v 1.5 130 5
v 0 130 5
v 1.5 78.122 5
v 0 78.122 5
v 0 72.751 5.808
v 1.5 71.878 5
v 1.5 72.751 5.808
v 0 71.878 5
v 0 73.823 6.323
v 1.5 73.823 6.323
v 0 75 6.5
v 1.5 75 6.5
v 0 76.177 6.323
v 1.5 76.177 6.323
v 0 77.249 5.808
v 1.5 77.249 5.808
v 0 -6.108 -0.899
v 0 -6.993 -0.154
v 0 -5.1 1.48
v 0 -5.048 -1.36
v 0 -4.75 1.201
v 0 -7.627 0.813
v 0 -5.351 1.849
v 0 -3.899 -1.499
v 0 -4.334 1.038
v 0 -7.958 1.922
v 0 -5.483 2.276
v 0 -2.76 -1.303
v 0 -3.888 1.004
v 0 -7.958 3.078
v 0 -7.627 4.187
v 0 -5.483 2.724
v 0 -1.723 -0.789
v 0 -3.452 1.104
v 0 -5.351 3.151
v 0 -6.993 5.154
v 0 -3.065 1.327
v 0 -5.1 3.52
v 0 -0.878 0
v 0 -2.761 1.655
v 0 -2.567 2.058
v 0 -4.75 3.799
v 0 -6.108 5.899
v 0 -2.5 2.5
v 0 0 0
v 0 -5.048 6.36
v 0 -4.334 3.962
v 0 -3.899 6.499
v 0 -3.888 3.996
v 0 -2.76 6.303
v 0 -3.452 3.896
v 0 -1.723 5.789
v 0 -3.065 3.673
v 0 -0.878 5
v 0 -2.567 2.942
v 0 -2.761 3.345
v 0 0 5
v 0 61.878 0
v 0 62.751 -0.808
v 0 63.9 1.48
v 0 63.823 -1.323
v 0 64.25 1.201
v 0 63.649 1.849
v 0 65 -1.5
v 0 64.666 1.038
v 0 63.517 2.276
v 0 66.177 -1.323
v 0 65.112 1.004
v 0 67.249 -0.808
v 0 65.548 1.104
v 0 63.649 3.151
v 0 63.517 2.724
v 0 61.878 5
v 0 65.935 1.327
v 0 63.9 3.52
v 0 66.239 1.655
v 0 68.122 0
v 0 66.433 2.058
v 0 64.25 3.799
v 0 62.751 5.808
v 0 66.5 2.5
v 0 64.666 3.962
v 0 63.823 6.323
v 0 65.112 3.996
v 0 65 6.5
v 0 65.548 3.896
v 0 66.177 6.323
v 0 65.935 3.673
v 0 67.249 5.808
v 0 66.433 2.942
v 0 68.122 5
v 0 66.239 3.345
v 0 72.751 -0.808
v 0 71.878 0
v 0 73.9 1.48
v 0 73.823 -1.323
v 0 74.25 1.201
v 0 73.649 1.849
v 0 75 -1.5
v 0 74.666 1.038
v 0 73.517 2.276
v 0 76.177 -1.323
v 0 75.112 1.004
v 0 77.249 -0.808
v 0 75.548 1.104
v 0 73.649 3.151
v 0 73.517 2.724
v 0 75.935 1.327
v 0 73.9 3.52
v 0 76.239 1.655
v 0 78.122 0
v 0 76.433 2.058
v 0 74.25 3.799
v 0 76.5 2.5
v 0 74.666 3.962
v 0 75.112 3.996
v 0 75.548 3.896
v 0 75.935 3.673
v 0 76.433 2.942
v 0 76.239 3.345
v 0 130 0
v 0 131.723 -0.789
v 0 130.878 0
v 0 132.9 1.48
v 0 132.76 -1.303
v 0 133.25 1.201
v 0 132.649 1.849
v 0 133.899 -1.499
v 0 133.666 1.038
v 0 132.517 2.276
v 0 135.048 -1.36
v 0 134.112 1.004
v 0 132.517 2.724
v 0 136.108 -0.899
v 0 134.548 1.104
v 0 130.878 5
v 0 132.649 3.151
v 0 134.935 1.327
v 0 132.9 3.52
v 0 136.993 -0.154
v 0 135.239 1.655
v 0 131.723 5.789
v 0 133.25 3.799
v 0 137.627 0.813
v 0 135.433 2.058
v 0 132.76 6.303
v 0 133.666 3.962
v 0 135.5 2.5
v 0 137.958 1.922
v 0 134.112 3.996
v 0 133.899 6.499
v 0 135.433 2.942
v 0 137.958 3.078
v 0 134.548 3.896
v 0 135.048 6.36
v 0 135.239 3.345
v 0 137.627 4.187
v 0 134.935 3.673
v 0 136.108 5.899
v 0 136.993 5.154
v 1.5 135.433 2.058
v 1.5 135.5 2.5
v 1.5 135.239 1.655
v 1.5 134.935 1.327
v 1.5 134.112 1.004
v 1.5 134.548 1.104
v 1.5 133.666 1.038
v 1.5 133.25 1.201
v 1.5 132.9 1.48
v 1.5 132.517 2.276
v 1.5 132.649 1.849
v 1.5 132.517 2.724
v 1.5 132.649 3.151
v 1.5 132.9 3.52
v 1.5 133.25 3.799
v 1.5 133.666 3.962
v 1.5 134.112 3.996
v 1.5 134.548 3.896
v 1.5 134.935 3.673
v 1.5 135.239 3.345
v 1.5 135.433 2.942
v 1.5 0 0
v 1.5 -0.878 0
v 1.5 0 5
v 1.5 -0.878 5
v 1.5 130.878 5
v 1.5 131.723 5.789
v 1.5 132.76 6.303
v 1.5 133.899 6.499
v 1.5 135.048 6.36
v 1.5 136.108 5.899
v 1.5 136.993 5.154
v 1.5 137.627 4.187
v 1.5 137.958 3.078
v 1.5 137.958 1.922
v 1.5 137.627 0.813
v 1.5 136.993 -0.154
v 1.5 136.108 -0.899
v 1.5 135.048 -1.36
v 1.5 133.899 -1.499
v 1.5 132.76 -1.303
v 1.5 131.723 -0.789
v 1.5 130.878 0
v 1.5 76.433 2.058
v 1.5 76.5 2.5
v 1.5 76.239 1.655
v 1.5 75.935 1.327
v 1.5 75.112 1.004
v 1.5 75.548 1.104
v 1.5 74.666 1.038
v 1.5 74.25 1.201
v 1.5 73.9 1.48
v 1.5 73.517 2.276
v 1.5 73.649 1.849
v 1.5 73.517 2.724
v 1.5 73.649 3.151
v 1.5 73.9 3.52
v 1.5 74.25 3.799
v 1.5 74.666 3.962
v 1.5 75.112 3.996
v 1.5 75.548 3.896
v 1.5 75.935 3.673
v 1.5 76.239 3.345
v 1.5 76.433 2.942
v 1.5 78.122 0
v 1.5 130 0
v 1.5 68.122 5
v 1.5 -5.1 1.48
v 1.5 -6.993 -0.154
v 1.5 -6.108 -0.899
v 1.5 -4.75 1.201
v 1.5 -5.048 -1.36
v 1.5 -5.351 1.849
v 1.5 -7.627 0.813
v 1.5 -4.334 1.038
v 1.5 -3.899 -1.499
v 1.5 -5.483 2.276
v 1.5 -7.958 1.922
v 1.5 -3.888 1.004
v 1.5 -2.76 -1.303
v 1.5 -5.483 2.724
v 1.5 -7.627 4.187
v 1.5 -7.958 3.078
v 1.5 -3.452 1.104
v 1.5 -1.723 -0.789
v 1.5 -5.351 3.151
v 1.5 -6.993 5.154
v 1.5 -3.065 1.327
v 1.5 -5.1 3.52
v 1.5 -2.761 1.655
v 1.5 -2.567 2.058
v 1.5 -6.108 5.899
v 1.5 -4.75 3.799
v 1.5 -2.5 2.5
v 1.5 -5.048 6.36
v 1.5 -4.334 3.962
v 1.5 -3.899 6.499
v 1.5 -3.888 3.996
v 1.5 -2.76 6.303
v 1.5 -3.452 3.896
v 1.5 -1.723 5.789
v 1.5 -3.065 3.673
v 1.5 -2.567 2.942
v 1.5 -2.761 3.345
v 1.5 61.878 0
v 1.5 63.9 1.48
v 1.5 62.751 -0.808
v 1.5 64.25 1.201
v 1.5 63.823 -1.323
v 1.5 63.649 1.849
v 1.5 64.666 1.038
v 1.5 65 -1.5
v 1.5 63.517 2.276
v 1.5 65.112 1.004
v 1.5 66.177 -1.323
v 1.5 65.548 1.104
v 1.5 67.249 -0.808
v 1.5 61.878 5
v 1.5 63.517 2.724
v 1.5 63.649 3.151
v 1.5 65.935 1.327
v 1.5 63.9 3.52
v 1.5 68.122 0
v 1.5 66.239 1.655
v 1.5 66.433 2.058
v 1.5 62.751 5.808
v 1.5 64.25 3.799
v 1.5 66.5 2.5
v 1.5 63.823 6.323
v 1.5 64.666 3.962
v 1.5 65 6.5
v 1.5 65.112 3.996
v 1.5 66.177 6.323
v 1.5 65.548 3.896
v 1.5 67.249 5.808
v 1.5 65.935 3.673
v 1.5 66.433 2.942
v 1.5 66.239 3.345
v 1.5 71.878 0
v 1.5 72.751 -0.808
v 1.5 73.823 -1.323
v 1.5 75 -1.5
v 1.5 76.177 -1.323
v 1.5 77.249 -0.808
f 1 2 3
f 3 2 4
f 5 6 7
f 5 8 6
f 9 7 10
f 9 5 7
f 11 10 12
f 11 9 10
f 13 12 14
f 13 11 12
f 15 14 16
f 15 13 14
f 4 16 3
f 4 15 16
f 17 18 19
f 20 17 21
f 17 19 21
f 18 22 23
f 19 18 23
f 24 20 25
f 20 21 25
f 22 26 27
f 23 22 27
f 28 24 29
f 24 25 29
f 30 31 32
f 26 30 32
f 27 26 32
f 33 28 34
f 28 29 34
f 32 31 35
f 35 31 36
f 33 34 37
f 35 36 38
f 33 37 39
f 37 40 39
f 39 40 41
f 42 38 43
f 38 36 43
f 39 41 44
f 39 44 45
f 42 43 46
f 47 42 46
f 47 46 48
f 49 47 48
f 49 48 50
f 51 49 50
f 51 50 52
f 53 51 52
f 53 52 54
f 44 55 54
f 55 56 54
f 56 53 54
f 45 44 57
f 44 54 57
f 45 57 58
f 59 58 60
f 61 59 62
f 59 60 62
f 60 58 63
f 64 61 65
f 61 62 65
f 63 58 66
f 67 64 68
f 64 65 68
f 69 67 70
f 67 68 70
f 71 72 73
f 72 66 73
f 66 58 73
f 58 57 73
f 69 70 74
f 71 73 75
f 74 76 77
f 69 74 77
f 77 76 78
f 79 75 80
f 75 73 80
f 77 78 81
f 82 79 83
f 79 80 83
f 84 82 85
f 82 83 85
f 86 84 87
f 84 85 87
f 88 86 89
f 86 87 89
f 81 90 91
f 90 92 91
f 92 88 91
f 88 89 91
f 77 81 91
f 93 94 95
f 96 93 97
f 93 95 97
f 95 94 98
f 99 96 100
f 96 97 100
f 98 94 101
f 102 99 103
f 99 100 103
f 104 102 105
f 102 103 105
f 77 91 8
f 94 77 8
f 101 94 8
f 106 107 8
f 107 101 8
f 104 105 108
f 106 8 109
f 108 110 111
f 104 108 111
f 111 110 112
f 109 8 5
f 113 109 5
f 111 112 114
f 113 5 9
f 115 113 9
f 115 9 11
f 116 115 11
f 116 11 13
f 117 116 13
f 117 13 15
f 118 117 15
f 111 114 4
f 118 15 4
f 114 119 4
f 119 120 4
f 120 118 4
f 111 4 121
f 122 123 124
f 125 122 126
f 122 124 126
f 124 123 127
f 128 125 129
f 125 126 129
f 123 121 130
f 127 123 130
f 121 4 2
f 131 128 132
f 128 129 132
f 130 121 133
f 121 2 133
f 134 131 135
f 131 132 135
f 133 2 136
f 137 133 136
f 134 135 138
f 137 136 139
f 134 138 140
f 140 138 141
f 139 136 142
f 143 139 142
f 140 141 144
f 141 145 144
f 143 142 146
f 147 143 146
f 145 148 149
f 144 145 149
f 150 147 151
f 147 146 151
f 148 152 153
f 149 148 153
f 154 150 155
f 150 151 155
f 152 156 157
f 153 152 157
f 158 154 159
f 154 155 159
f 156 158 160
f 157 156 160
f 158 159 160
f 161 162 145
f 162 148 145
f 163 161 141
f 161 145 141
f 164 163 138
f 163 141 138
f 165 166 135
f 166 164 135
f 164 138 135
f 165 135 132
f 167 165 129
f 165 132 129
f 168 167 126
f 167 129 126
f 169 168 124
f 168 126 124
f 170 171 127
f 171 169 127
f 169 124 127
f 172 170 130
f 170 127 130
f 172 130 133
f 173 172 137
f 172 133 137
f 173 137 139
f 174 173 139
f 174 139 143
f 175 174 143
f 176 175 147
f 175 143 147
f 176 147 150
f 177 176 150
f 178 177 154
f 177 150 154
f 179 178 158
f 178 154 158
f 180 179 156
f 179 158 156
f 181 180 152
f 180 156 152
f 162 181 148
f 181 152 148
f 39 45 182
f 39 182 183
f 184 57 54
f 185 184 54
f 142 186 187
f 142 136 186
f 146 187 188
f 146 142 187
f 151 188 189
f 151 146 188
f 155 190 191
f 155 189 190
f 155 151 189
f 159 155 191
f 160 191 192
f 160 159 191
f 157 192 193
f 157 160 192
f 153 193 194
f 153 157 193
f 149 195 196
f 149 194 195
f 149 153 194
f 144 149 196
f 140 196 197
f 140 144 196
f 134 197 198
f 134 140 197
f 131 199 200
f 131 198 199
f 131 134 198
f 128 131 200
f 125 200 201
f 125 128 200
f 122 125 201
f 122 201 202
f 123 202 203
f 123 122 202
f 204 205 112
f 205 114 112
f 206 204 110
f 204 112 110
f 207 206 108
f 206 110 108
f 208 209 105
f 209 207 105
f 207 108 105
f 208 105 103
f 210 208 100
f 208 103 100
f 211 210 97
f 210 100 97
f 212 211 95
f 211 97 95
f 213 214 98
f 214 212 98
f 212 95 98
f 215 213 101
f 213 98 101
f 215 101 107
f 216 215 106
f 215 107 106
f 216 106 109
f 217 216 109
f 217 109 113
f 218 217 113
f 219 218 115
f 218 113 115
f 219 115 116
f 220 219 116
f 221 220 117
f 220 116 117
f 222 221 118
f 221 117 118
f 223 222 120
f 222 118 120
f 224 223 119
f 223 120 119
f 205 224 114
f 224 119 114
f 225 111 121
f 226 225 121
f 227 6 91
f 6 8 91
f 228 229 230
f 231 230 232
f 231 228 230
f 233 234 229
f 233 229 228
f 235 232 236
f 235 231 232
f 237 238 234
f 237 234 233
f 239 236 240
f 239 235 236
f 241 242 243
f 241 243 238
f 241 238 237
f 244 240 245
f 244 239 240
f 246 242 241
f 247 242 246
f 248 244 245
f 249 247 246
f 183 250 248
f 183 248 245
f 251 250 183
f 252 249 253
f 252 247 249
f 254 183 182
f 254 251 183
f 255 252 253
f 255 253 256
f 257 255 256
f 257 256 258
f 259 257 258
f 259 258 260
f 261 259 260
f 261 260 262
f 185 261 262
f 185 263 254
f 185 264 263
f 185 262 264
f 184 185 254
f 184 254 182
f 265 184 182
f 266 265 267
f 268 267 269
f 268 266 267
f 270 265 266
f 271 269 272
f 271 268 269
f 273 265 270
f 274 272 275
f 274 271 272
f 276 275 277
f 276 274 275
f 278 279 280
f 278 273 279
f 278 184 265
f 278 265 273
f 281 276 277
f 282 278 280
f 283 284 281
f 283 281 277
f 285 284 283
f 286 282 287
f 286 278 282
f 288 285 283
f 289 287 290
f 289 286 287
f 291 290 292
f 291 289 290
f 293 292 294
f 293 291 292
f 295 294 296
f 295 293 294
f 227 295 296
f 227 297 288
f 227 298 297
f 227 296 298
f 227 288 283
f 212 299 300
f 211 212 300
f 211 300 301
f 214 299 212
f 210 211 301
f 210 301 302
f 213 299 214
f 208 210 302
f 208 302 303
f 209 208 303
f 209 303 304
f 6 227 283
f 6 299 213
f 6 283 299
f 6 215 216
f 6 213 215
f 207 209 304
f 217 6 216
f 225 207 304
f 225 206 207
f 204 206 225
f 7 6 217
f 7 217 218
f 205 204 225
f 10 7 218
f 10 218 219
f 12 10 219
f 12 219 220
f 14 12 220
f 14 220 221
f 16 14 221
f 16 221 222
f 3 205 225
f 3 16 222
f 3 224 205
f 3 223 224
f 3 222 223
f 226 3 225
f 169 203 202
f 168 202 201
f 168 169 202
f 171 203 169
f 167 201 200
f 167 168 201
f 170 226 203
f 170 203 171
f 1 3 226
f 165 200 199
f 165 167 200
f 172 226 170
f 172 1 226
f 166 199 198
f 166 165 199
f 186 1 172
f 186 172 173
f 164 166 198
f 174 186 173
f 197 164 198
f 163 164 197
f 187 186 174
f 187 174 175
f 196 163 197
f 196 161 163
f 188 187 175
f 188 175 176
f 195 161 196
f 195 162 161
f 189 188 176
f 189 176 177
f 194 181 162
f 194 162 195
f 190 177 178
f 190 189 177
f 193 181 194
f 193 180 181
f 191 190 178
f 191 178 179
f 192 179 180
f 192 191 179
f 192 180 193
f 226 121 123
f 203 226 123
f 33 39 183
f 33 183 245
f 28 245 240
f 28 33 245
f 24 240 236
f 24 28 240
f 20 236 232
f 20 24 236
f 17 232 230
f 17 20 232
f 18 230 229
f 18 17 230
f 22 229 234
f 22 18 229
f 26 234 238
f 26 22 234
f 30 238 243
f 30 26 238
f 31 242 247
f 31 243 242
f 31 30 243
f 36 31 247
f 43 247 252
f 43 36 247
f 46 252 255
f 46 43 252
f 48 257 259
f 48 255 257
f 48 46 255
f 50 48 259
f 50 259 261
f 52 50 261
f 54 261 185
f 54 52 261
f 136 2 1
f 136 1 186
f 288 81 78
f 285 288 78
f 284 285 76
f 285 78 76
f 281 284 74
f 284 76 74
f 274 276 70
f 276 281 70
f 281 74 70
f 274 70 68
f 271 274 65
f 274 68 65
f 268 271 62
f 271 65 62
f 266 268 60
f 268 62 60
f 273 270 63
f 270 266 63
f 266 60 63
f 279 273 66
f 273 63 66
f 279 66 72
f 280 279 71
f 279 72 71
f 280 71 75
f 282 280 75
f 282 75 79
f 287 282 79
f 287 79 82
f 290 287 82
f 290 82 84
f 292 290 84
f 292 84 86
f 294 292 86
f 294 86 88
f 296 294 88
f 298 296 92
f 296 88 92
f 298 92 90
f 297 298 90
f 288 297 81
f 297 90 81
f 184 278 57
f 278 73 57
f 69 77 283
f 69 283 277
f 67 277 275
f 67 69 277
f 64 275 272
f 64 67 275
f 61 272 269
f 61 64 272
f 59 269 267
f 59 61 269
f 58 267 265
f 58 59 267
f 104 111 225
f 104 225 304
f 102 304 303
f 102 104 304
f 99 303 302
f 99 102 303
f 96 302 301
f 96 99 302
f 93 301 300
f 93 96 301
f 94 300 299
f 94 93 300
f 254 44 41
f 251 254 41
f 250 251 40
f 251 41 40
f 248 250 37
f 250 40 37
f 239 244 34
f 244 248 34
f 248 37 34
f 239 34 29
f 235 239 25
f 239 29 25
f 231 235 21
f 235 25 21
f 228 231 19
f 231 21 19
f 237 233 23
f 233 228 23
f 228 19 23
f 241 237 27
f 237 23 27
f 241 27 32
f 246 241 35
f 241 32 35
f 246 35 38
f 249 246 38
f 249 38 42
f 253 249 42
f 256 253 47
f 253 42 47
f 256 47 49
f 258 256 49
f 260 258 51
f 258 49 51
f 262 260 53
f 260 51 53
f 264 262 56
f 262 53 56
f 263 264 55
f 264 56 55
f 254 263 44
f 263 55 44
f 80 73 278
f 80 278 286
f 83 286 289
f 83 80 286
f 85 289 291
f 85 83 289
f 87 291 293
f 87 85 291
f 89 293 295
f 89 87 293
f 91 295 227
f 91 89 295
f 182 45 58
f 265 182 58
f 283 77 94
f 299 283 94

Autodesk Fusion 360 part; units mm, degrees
sketch "Boceto1" plane through (0, 0, 0) normal (1, 0, 0) x (0, 1, 0)
  line L0 (0, 0) -> (-0.8775, 0)
  line L1 (0, 5) -> (-0.8775, 5)
  line L2 (130, 0) -> (130.8775, 0)
  line L3 (130, 5) -> (130.8775, 5)
  arc A0 (-0.8775, 5) -> (-0.8775, 0) centre (-4, 2.5) ccw
  line L4 (78.1225, 0) -> (130, 0)
  line L5 (130, 5) -> (78.1225, 5)
  line L6 (75.0004, 5) -> (74.9996, 5)
  arc A1 (78.1225, 5) -> (71.8775, 5) centre (75, 2.5) ccw
  arc A2 (71.8775, 0) -> (78.1225, 0) centre (75, 2.5) ccw
  arc A3 (130.8775, 0) -> (130.8775, 5) centre (134, 2.5) ccw
  line L7 (0, 0) -> (61.8775, 0)
  line L8 (71.8775, 5) -> (68.1225, 5)
  line L9 (61.8775, 5) -> (0, 5)
  arc A4 (61.8775, 0) -> (68.1225, 0) centre (65, 2.5) ccw
  arc A5 (68.1225, 5) -> (61.8775, 5) centre (65, 2.5) ccw
  line L10 (0, 0) -> (65, 0)
  line L11 (68.1225, 0) -> (71.8775, 0)
  line L12 (0, 0) -> (61.8775, 0)
  line L13 (68.1225, 0) -> (71.8775, 0)
  circle A6 centre (-4, 2.5) radius 1.5
  circle A7 centre (65, 2.5) radius 1.5
  circle A8 centre (75, 2.5) radius 1.5
  circle A9 centre (134, 2.5) radius 1.5
  dimension "d1" = 130
  dimension "d2" = 5
  dimension "d7" = 8
  dimension "d9" = 65
  dimension "d10" = 2.5
  dimension "d11" = 8
  dimension "d15" = 3
  dimension "d16" = 3
  dimension "d17" = 3
  dimension "d18" = 3
extrude "Extruir2" add sketch "Boceto1" along normal blind 1.5
